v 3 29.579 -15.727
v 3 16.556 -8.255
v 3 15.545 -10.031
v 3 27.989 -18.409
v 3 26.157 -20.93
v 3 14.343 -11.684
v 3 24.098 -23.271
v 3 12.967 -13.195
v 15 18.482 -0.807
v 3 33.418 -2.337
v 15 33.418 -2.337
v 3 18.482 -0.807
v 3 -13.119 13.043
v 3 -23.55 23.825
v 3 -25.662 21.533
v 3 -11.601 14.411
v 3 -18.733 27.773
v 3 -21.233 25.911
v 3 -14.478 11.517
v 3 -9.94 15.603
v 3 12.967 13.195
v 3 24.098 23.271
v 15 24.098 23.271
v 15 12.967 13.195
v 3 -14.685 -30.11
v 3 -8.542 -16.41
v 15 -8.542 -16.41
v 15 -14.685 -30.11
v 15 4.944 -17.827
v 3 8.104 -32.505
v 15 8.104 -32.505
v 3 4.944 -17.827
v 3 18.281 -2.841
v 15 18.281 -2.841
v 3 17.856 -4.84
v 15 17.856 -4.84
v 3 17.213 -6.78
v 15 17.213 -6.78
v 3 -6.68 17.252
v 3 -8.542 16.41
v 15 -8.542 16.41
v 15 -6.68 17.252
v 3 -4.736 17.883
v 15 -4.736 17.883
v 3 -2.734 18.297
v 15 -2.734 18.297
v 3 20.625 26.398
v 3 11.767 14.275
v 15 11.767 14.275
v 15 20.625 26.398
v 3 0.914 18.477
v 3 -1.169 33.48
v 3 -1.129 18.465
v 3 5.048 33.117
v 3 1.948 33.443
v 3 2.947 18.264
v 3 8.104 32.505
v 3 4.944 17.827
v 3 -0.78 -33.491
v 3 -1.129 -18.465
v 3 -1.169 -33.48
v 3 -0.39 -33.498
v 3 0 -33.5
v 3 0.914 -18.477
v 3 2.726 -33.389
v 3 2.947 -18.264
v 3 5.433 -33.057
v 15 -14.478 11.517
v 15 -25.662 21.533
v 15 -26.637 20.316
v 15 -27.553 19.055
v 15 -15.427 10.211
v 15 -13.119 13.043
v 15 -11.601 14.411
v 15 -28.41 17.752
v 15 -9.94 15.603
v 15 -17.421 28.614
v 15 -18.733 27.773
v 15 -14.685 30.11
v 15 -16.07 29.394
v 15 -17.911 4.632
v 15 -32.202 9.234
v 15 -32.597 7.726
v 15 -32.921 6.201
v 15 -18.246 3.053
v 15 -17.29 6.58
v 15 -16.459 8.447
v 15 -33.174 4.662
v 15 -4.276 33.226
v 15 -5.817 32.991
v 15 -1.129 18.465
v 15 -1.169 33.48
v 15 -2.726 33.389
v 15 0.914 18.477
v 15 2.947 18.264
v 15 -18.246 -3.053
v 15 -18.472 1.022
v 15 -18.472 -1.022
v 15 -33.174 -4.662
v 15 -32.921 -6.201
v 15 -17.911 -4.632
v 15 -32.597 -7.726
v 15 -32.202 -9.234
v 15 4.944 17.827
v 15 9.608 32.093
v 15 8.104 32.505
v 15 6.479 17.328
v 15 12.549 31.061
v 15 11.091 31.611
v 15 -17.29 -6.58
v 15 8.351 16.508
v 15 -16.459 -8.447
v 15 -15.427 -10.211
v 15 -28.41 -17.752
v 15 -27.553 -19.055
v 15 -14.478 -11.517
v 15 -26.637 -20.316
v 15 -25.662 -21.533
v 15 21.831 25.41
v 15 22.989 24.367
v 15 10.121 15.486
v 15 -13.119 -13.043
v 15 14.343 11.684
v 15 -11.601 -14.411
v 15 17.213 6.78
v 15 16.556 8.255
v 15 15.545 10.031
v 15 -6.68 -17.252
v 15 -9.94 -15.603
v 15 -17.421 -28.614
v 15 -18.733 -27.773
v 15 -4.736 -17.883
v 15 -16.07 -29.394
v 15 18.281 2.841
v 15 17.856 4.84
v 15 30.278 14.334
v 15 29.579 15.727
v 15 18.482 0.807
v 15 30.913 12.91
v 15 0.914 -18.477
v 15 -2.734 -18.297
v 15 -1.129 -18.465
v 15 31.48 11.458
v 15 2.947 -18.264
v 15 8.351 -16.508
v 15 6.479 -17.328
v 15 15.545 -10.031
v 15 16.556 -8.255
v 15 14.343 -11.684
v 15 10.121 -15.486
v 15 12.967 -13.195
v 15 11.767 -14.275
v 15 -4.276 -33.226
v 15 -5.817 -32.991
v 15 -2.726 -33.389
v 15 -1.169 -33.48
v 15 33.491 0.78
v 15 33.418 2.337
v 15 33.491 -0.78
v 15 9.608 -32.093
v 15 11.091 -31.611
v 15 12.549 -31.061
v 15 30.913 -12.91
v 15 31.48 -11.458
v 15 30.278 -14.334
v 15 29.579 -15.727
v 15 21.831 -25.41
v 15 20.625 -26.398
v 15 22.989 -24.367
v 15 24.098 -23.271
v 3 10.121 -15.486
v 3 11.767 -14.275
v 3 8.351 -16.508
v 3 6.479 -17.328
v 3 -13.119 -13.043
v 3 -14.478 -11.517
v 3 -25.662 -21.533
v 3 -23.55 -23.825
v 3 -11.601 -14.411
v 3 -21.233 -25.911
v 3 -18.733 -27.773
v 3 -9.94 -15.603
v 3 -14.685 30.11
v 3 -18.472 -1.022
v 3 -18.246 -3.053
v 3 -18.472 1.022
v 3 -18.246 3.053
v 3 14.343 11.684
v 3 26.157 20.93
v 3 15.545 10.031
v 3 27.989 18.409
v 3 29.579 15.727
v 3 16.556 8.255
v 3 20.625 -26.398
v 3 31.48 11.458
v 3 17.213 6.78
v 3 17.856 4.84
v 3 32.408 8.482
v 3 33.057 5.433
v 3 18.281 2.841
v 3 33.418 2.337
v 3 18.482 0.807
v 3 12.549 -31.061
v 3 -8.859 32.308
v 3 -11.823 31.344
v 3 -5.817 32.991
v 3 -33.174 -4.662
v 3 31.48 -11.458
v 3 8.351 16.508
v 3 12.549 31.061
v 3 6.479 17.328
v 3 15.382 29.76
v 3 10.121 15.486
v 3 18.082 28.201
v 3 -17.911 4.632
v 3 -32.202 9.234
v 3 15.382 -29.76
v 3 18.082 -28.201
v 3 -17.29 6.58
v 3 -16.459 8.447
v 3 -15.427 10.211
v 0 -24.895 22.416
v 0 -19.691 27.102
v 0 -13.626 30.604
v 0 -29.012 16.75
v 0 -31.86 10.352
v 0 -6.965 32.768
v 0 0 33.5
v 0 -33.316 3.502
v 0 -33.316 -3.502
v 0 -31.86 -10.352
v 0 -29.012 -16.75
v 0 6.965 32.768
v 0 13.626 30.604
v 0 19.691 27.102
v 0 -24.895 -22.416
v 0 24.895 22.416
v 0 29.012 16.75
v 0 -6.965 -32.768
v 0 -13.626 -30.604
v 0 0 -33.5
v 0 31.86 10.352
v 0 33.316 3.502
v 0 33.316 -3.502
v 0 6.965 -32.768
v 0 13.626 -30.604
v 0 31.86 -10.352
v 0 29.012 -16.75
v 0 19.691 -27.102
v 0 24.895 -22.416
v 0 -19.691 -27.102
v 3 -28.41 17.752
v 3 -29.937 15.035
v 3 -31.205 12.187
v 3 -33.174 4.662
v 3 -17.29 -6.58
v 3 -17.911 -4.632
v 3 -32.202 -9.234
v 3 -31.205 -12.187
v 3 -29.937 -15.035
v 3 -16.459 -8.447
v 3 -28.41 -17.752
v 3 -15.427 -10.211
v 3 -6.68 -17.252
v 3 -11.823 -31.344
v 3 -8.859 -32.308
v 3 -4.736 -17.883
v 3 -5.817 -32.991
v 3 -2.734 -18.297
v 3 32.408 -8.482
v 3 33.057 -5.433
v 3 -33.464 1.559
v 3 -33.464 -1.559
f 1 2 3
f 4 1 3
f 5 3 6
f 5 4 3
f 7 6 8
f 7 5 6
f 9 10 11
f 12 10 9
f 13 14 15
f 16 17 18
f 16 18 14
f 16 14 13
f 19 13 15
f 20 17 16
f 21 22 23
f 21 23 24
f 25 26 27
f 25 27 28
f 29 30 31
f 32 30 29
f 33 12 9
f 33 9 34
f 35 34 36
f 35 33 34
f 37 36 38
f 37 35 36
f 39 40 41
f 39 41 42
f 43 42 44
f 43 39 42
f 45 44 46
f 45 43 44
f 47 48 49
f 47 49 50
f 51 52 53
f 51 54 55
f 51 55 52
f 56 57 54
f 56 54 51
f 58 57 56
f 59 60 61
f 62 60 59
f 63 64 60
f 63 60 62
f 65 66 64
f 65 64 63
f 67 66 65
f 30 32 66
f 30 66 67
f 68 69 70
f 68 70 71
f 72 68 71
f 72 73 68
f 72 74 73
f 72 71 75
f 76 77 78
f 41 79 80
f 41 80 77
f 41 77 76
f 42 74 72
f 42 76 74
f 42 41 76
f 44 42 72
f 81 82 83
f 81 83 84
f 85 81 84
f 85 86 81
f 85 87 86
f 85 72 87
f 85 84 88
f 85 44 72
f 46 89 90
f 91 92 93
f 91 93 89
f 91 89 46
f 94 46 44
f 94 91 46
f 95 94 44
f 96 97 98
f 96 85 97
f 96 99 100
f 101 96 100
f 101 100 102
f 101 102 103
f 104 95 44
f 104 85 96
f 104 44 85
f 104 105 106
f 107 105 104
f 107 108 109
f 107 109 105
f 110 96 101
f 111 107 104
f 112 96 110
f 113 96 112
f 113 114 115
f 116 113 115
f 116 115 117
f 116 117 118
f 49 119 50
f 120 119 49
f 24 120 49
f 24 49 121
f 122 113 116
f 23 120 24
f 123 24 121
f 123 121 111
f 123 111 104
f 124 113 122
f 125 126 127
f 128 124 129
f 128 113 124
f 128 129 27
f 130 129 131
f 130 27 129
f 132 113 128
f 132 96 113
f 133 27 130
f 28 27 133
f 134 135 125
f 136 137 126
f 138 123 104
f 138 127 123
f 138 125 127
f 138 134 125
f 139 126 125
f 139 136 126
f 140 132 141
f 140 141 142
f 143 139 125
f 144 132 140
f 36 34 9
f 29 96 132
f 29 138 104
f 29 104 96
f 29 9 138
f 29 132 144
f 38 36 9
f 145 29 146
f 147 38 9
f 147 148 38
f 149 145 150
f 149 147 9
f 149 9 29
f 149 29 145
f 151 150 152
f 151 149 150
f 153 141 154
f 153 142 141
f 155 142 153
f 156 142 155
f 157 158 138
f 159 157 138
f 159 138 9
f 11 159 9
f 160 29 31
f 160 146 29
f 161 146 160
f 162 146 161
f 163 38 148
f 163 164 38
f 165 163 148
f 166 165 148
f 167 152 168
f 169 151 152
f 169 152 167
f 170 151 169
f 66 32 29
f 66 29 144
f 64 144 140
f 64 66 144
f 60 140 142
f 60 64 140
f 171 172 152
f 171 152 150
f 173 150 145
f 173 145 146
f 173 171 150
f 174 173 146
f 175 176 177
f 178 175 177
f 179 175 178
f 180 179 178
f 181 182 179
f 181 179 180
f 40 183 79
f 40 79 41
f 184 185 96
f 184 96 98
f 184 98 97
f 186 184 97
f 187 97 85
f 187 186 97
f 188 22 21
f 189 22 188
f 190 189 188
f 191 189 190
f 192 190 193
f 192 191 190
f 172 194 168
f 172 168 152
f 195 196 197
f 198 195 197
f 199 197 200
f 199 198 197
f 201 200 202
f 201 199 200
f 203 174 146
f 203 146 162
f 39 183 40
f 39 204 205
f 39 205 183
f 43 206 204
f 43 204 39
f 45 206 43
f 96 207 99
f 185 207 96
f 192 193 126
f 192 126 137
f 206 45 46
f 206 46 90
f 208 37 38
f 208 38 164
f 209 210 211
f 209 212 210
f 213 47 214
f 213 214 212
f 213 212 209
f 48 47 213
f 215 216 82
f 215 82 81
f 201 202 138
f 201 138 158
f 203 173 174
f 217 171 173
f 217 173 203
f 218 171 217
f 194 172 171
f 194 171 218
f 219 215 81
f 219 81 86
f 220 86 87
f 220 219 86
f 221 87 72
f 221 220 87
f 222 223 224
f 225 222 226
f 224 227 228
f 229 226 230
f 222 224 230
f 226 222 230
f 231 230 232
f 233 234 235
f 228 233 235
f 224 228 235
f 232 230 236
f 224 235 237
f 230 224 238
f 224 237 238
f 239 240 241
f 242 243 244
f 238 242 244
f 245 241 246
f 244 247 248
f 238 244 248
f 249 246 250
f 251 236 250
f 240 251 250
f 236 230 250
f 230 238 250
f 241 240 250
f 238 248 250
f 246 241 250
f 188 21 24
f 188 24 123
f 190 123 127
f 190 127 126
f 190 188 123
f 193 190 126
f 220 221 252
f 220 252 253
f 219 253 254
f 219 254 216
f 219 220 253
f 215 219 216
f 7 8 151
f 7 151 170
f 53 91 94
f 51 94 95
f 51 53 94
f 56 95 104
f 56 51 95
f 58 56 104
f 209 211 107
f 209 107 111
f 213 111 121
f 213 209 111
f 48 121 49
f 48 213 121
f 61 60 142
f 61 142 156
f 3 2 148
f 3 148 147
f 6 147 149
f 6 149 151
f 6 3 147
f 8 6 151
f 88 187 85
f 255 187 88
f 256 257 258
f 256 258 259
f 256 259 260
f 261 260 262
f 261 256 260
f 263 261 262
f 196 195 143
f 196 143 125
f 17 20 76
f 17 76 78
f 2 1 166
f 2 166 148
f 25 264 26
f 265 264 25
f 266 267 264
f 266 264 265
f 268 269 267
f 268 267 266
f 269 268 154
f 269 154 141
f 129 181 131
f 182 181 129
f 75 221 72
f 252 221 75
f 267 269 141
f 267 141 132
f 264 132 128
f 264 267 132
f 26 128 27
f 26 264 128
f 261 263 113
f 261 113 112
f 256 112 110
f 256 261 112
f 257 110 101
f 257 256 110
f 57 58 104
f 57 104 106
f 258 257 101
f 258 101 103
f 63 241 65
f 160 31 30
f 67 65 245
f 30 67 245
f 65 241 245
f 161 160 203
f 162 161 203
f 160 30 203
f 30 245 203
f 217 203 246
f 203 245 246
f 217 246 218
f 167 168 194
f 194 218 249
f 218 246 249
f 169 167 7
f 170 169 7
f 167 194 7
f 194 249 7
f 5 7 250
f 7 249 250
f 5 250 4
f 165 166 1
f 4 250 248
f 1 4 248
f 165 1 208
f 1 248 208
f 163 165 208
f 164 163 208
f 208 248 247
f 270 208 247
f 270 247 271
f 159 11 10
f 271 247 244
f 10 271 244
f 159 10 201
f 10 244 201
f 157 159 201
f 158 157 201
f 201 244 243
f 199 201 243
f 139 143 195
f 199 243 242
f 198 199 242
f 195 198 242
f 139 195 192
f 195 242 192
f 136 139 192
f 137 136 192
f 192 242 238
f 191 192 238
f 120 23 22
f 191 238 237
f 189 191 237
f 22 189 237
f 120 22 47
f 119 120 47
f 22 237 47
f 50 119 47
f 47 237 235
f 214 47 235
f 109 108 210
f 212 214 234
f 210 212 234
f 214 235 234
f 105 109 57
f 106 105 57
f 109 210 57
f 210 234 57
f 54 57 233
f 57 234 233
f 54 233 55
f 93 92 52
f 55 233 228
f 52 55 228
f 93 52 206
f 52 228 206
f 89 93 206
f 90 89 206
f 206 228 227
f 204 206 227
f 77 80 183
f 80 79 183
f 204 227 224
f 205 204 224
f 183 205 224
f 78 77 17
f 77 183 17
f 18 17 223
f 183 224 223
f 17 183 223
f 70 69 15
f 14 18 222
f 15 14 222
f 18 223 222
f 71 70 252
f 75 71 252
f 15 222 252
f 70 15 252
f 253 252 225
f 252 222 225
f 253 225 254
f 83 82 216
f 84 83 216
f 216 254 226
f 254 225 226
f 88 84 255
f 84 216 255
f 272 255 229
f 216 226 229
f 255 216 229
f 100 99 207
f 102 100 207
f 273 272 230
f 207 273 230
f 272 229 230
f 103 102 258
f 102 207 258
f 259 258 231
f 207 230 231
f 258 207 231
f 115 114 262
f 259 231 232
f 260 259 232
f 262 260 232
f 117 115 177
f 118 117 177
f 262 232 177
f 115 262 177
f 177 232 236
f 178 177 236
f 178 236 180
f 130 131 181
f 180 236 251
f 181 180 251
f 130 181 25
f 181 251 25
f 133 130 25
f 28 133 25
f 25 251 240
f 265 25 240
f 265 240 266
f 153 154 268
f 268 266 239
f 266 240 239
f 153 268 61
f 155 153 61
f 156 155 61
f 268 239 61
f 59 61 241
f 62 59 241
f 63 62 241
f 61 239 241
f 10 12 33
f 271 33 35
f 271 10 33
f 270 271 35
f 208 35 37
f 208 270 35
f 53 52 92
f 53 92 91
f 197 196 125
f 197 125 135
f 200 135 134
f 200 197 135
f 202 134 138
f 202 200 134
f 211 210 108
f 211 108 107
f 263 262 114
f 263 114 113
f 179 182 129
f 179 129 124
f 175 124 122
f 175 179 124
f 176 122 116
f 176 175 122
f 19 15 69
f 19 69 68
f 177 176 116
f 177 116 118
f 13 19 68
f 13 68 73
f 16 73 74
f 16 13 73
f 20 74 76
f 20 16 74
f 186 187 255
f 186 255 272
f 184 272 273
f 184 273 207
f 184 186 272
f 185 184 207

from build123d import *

# Parameters (mm, degrees)
SKETCH1_R           = 33.5
BOSS_EXTRUDE1_DEPTH = 15
CUT_EXTRUDE1_START  = -12
CUT_EXTRUDE1_DEPTH  = 12


with BuildPart() as part:
    # Sketch1 → Boss-Extrude1 (new body)
    with BuildSketch(Plane(origin=(0, 0, 0), x_dir=(0, 0, -1), z_dir=(1, 0, 0))):
        Circle(SKETCH1_R)
    extrude(amount=BOSS_EXTRUDE1_DEPTH)

    # Sketch3 → Cut-Extrude1 (cut)
    with BuildSketch(Plane(origin=(15, 0, 0), x_dir=(0, 0, -1), z_dir=(1, 0, 0)).offset(CUT_EXTRUDE1_START)):
        with BuildLine():
            Line((2.33684187, 33.418395684), (0.806958666, 18.482392099))
            ThreePointArc((0.806958666, 18.482392099), (3.84636628, 18.095730614), (6.780272694, 17.212725008))
            Line((6.780272694, 17.212725008), (11.457674801, 31.479702796))
            ThreePointArc((11.457674801, 31.479702796), (6.965041642, 32.767944625), (2.33684187, 33.418395684))
        make_face()
        with BuildLine():
            Line((15.727297353, 29.578744361), (8.254659543, 16.55628569))
            ThreePointArc((8.254659543, 16.55628569), (10.874027167, 14.966814396), (13.195133309, 12.96682139))
            Line((13.195133309, 12.96682139), (23.27105541, 24.097883311))
            ThreePointArc((23.27105541, 24.097883311), (19.690805952, 27.102069312), (15.727297353, 29.578744361))
        make_face()
        with BuildLine():
            Line((26.398360246, 20.624659423), (14.275054793, 11.767447075))
            ThreePointArc((14.275054793, 11.767447075), (16.02146997, 9.25), (17.328435501, 6.478836553))
            Line((17.328435501, 6.478836553), (31.060659128, 12.549320879))
            ThreePointArc((31.060659128, 12.549320879), (29.011851027, 16.75), (26.398360246, 20.624659423))
        make_face()
        with BuildLine():
            Line((32.50490683, 8.104383503), (17.827163384, 4.943909957))
            ThreePointArc((17.827163384, 4.943909957), (18.398655064, 1.93377657), (18.465493771, -1.129397981))
            Line((18.465493771, -1.129397981), (33.479592705, -1.16913314))
            ThreePointArc((33.479592705, -1.16913314), (33.316483495, 3.501703519), (32.50490683, 8.104383503))
        make_face()
        with BuildLine():
            Line((32.991059726, -5.817213952), (18.296793472, -2.734474106))
            ThreePointArc((18.296793472, -2.734474106), (17.594545551, -5.716814396), (16.409700414, -8.542349345))
            Line((16.409700414, -8.542349345), (30.109600551, -14.685433417))
            ThreePointArc((30.109600551, -14.685433417), (31.860393296, -10.352069312), (32.991059726, -5.817213952))
        make_face()
        with BuildLine():
            Line((27.772758681, -18.732962266), (15.602741748, -9.940042754))
            ThreePointArc((15.602741748, -9.940042754), (13.748179271, -12.378916218), (11.516520778, -14.478250902))
            Line((11.516520778, -14.478250902), (21.533384924, -25.662488844))
            ThreePointArc((21.533384924, -25.662488844), (24.895351653, -22.415875313), (27.772758681, -18.732962266))
        make_face()
        with BuildLine():
            Line((17.752295352, -28.409611221), (10.210834228, -15.426887708))
            ThreePointArc((10.210834228, -15.426887708), (7.524627897, -16.900590966), (4.632030075, -17.910731347))
            Line((4.632030075, -17.910731347), (9.23385142, -32.202266814))
            ThreePointArc((9.23385142, -32.202266814), (13.625677543, -30.603772831), (17.752295352, -28.409611221))
        make_face()
        with BuildLine():
            Line((4.662298882, -33.173980303), (3.053380708, -18.246283628))
            ThreePointArc((3.053380708, -18.246283628), (0, -18.5), (-3.053380708, -18.246283628))
            Line((-3.053380708, -18.246283628), (-4.662298882, -33.173980303))
            ThreePointArc((-4.662298882, -33.173980303), (0, -33.5), (4.662298882, -33.173980303))
        make_face()
        with BuildLine():
            Line((-9.23385142, -32.202266814), (-4.632030075, -17.910731347))
            ThreePointArc((-4.632030075, -17.910731347), (-7.524627897, -16.900590966), (-10.210834228, -15.426887708))
            Line((-10.210834228, -15.426887708), (-17.752295352, -28.409611221))
            ThreePointArc((-17.752295352, -28.409611221), (-13.625677543, -30.603772831), (-9.23385142, -32.202266814))
        make_face()
        with BuildLine():
            Line((-21.533384924, -25.662488844), (-11.516520778, -14.478250902))
            ThreePointArc((-11.516520778, -14.478250902), (-13.748179271, -12.378916218), (-15.602741748, -9.940042754))
            Line((-15.602741748, -9.940042754), (-27.772758681, -18.732962266))
            ThreePointArc((-27.772758681, -18.732962266), (-24.895351653, -22.415875313), (-21.533384924, -25.662488844))
        make_face()
        with BuildLine():
            Line((-30.109600551, -14.685433417), (-16.409700414, -8.542349345))
            ThreePointArc((-16.409700414, -8.542349345), (-17.594545551, -5.716814396), (-18.296793472, -2.734474106))
            Line((-18.296793472, -2.734474106), (-32.991059726, -5.817213952))
            ThreePointArc((-32.991059726, -5.817213952), (-31.860393296, -10.352069312), (-30.109600551, -14.685433417))
        make_face()
        with BuildLine():
            Line((-33.479592705, -1.16913314), (-18.465493771, -1.129397981))
            ThreePointArc((-18.465493771, -1.129397981), (-18.398655064, 1.93377657), (-17.827163384, 4.943909957))
            Line((-17.827163384, 4.943909957), (-32.50490683, 8.104383503))
            ThreePointArc((-32.50490683, 8.104383503), (-33.316483495, 3.501703519), (-33.479592705, -1.16913314))
        make_face()
        with BuildLine():
            Line((-31.060659128, 12.549320879), (-17.328435501, 6.478836553))
            ThreePointArc((-17.328435501, 6.478836553), (-16.02146997, 9.25), (-14.275054793, 11.767447075))
            Line((-14.275054793, 11.767447075), (-26.398360246, 20.624659423))
            ThreePointArc((-26.398360246, 20.624659423), (-29.011851027, 16.75), (-31.060659128, 12.549320879))
        make_face()
        with BuildLine():
            Line((-23.27105541, 24.097883311), (-13.195133309, 12.96682139))
            ThreePointArc((-13.195133309, 12.96682139), (-10.874027167, 14.966814396), (-8.254659543, 16.55628569))
            Line((-8.254659543, 16.55628569), (-15.727297353, 29.578744361))
            ThreePointArc((-15.727297353, 29.578744361), (-19.690805952, 27.102069312), (-23.27105541, 24.097883311))
        make_face()
        with BuildLine():
            Line((-11.457674801, 31.479702796), (-6.780272694, 17.212725008))
            ThreePointArc((-6.780272694, 17.212725008), (-3.84636628, 18.095730614), (-0.806958666, 18.482392099))
            Line((-0.806958666, 18.482392099), (-2.33684187, 33.418395684))
            ThreePointArc((-2.33684187, 33.418395684), (-6.965041642, 32.767944625), (-11.457674801, 31.479702796))
        make_face()
    extrude(amount=CUT_EXTRUDE1_DEPTH, mode=Mode.SUBTRACT)


solid = part.part
